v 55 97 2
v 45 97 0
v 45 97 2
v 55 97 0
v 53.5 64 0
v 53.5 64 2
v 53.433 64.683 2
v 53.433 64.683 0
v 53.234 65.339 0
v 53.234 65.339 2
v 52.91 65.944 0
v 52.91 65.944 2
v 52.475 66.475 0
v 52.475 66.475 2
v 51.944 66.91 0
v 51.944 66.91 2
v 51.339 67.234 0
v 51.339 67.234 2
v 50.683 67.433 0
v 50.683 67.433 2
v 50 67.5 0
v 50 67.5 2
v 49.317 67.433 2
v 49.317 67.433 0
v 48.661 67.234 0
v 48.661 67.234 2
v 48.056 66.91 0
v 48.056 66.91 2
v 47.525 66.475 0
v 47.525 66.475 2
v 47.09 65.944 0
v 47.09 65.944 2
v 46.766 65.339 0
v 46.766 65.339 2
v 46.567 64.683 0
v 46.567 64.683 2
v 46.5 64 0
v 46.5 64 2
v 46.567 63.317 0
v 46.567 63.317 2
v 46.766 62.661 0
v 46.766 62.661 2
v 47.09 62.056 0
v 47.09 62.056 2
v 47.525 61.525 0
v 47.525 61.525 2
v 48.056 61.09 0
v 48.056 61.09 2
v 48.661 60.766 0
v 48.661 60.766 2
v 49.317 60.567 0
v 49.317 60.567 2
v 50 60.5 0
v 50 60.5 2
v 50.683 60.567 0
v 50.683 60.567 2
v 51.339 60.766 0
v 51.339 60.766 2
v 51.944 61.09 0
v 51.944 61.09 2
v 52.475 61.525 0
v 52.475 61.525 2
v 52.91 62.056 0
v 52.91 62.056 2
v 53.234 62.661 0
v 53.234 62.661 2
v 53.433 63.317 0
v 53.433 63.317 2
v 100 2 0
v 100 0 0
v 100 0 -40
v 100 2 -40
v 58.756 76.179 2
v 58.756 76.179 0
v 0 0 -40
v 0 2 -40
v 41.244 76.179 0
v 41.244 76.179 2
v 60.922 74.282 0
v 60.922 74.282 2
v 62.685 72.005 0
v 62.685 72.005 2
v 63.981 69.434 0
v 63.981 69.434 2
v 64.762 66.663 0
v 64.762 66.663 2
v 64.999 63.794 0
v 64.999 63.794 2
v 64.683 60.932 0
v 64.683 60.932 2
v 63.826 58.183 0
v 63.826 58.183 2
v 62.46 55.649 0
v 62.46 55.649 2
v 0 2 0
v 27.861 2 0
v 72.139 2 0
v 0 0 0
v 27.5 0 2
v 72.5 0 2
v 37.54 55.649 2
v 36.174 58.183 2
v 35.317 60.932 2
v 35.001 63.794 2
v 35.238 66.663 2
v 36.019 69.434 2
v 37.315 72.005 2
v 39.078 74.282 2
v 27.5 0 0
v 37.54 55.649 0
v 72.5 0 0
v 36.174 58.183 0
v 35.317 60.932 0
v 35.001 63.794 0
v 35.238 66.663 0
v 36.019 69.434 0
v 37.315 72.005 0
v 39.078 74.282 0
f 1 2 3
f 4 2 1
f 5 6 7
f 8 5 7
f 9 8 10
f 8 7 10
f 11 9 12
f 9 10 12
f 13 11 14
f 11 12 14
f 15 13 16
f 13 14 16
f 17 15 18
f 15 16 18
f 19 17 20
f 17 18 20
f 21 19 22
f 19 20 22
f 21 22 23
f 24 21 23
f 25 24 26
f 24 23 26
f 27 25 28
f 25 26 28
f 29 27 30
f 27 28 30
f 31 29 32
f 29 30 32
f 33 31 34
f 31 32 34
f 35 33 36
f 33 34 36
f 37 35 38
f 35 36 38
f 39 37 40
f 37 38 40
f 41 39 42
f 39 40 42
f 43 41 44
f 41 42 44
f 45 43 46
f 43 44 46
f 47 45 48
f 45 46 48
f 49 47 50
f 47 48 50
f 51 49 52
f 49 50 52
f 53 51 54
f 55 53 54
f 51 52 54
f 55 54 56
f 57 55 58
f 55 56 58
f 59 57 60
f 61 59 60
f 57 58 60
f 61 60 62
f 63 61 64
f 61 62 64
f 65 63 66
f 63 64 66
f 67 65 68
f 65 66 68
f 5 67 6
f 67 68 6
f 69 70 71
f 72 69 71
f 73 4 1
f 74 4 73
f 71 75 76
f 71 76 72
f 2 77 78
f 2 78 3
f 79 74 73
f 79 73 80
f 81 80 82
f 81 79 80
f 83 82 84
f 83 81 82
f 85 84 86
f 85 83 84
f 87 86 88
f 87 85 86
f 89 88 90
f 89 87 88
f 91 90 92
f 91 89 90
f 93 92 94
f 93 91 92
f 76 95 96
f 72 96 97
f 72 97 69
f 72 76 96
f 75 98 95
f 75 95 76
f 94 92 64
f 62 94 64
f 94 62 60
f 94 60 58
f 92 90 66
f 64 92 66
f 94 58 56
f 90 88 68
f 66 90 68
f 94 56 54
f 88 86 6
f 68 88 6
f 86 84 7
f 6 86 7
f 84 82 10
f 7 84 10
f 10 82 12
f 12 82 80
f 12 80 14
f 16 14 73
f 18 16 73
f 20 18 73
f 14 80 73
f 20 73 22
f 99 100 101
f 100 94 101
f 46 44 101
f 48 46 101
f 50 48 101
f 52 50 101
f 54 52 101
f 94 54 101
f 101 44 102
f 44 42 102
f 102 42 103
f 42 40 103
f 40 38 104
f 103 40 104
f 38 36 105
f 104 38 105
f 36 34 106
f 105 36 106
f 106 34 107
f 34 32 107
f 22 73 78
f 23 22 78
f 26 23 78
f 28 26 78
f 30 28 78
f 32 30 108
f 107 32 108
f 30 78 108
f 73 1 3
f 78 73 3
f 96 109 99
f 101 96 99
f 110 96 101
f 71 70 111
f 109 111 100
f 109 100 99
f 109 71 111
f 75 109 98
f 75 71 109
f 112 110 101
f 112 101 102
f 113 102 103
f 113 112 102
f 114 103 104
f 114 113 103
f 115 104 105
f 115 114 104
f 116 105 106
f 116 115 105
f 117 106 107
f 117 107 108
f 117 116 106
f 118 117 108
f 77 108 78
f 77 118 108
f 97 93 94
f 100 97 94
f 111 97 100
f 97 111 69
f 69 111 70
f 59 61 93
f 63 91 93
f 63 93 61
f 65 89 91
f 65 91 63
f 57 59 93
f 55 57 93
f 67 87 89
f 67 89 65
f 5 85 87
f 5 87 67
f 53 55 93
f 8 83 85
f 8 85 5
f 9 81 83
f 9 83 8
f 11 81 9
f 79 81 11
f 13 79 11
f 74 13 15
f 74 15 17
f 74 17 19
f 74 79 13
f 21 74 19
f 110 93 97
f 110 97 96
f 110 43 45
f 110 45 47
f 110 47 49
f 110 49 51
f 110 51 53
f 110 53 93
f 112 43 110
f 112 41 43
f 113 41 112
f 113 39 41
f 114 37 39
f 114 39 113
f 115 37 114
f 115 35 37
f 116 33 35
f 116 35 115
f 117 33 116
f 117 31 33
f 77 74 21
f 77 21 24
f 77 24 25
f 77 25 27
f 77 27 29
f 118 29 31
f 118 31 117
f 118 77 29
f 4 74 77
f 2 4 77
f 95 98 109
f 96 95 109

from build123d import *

# Parameters (mm, degrees)
SKETCH_1_W          = 100
SKETCH_1_H          = 40
EXTRUDE_1_DEPTH     = 2
EXTRUDE_2_DEPTH     = 2
SKETCH_4_R          = 3.5
CUT_EXTRUDE_1_DEPTH = 2


with BuildPart() as part:
    # 草图1 → 凸台-拉伸1 (new body)
    with BuildSketch(Plane(origin=(0, 0, 0), x_dir=(1, 0, 0), z_dir=(0, 1, 0))):
        with Locations((50, 20)):
            Rectangle(SKETCH_1_W, SKETCH_1_H)
    extrude(amount=EXTRUDE_1_DEPTH)

    # 草图3 → 凸台-拉伸2 (add)
    with BuildSketch(Plane.XY):
        with BuildLine():
            Line((72.5, 0), (27.5, 0))
            Line((27.5, 0), (37.539738947, 55.648838734))
            ThreePointArc((37.539738947, 55.648838734), (35.238312644, 66.663191018), (41.243617117, 76.178906306))
            Line((41.243617117, 76.178906306), (45, 97))
            Line((45, 97), (55, 97))
            Line((55, 97), (58.756382883, 76.178906306))
            ThreePointArc((58.756382883, 76.178906306), (64.761687356, 66.663191018), (62.460261053, 55.648838734))
            Line((62.460261053, 55.648838734), (72.5, 0))
        make_face()
    extrude(amount=EXTRUDE_2_DEPTH)

    # 草图4 → 切除-拉伸1 (cut)
    with BuildSketch(Plane.XY.offset(2)):
        with Locations((50, 64)):
            Circle(SKETCH_4_R)
    extrude(amount=-CUT_EXTRUDE_1_DEPTH, mode=Mode.SUBTRACT)


solid = part.part
